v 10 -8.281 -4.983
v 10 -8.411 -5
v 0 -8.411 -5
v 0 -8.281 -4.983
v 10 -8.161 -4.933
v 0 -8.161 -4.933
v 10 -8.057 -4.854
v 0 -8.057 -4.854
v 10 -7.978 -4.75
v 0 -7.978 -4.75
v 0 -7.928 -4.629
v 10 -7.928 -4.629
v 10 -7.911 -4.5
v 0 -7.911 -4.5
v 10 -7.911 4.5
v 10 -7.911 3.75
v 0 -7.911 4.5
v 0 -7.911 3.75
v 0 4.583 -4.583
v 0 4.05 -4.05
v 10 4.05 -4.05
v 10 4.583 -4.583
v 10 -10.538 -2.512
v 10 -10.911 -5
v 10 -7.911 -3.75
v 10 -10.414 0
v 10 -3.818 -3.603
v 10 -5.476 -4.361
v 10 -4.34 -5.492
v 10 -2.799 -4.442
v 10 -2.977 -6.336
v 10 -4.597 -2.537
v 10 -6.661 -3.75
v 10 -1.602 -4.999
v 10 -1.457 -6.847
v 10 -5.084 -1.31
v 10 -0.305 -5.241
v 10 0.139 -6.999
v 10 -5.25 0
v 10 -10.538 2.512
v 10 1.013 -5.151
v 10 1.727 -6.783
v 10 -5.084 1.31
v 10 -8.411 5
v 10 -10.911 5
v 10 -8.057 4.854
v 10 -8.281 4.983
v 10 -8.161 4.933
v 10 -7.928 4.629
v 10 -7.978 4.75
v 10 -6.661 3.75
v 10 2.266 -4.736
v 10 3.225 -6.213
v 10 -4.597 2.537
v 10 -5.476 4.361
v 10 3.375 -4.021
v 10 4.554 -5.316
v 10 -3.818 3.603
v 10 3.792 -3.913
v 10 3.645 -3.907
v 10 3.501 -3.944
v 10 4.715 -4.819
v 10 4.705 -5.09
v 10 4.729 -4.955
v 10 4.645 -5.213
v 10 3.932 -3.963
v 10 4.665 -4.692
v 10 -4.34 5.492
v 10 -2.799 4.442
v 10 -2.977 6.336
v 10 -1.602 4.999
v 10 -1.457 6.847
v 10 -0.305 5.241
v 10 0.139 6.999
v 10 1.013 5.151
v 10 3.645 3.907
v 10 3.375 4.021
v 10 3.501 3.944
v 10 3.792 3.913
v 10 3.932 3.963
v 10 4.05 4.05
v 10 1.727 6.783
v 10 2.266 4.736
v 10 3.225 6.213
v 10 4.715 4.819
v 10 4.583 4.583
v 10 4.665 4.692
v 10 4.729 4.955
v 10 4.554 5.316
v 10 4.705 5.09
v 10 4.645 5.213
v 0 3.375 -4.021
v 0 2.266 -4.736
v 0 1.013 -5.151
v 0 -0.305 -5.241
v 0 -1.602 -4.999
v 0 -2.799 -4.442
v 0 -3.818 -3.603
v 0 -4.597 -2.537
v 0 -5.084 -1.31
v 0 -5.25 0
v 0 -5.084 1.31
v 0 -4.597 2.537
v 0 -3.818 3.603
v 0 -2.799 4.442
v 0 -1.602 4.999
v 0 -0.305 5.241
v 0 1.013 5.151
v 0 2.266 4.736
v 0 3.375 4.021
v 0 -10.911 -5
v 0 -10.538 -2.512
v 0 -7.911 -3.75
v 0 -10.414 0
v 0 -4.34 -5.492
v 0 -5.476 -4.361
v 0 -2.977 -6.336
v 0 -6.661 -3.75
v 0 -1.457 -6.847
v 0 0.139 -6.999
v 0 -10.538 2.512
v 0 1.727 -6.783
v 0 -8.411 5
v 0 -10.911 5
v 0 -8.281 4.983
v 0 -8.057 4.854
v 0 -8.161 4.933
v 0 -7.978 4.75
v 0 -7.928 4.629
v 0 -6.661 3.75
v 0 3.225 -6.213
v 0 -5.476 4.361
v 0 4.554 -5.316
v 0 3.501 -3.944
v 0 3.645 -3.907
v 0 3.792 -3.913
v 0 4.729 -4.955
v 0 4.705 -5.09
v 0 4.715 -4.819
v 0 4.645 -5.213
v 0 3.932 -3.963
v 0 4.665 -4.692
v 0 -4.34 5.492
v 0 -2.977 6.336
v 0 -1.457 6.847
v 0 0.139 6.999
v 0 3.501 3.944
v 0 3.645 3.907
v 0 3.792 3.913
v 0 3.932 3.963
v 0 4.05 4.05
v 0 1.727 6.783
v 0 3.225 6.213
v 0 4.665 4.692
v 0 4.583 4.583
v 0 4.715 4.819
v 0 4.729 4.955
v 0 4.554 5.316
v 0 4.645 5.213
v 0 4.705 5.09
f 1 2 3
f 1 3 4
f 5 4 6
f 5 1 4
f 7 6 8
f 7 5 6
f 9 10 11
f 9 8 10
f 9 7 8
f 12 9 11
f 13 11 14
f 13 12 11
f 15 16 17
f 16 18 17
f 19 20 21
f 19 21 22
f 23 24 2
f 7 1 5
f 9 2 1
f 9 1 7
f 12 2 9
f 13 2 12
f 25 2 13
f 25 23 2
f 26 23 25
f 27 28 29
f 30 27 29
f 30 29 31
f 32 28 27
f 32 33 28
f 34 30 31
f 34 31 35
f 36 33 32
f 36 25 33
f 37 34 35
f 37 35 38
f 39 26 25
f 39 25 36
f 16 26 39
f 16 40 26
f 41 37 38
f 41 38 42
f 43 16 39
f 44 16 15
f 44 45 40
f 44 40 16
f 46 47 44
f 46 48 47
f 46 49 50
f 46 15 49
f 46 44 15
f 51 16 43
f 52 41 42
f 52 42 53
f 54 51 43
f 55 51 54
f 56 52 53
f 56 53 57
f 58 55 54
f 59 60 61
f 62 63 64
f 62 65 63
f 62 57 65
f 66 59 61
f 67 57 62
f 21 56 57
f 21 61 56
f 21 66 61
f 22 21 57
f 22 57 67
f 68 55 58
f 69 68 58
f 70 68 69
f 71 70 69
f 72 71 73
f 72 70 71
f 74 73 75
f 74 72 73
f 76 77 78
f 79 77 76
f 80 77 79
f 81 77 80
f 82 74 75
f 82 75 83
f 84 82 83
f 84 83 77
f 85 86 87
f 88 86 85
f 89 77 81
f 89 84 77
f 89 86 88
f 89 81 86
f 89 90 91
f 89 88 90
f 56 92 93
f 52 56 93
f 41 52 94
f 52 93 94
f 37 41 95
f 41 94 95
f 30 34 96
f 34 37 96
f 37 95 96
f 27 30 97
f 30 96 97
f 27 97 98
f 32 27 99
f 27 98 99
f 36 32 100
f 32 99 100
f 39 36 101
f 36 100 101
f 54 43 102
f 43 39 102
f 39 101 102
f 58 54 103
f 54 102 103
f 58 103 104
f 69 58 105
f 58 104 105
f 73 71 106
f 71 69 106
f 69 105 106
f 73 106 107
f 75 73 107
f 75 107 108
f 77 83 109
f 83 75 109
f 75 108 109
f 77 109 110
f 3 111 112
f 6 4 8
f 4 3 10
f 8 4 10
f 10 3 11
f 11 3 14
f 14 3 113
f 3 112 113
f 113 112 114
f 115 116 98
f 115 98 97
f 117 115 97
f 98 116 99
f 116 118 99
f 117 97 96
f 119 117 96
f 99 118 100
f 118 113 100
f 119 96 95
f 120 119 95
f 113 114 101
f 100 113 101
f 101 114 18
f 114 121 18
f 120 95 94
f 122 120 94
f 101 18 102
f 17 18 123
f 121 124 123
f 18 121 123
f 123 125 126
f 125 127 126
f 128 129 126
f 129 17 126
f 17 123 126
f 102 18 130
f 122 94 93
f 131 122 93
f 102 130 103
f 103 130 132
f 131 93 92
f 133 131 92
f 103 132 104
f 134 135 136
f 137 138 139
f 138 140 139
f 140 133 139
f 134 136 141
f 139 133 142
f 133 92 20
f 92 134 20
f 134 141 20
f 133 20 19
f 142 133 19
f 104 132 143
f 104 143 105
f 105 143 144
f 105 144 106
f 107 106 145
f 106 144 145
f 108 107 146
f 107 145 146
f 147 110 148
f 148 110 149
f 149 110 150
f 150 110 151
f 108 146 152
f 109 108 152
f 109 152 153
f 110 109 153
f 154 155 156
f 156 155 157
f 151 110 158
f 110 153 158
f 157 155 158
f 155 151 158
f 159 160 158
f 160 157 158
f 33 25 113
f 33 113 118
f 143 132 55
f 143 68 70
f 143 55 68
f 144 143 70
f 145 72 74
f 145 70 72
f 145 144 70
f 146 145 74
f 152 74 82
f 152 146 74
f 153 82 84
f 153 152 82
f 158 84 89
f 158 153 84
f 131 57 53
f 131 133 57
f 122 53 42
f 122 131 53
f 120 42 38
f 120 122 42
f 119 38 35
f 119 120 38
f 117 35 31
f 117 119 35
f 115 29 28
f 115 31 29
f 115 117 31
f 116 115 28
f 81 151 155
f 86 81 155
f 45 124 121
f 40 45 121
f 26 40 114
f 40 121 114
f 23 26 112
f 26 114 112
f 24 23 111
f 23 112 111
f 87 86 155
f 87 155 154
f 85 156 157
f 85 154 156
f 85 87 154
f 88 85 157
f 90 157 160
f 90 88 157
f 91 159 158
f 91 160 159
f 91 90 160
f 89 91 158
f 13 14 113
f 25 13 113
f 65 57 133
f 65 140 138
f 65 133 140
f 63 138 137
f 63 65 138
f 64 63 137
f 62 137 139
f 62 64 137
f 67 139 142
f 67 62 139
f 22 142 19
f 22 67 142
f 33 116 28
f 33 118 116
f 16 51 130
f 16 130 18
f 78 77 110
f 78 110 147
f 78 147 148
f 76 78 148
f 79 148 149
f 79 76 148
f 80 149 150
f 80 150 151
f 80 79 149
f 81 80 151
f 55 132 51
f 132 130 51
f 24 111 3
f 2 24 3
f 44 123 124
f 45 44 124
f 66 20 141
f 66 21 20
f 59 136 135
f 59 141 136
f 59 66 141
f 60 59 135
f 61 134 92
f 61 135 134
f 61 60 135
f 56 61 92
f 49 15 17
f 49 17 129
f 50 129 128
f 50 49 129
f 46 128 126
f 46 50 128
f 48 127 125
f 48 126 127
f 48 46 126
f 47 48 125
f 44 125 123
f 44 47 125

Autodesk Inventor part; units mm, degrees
ref_plane "YZ Plane" through (0, 0, 0) normal (1, 0, 0) x (0, 1, 0)
ref_plane "XZ Plane" through (0, 0, 0) normal (0, 1, 0) x (-1, 0, 0)
ref_plane "XY Plane" through (0, 0, 0) normal (0, 0, 1) x (1, 0, 0)
sketch "Sketch1" plane through (0, 0, 0) normal (1, 0, 0) x (0, 1, 0)
  arc A0 (3.7123, 3.7123) -> (3.7123, -3.7123) centre (0, 0) ccw
  line L0 (-5.9108, 3.75) -> (-7.9108, 3.75)
  line L1 (-7.9108, -3.75) -> (-5.9108, -3.75)
  line L2 (3.7123, -3.7123) -> (4.9497, -4.9497)
  line L3 (3.7123, 3.7123) -> (4.9497, 4.9497)
  arc A1 (-5.9108, -3.75) -> (4.9497, -4.9497) centre (0, 0) ccw
  arc A2 (4.9497, 4.9497) -> (-5.9108, 3.75) centre (0, 0) ccw
  line L4 (4.9497, 4.9497) -> (0, 0) construction
  line L5 (0, 0) -> (4.9497, -4.9497) construction
  line L6 (-7.9108, 5) -> (-10.9108, 5)
  line L7 (-10.9108, -5) -> (-7.9108, -5)
  line L8 (-7.9108, -5) -> (-7.9108, -3.75)
  line L9 (-7.9108, 3.75) -> (-7.9108, 5)
  arc A3 (-10.9108, -5) -> (-10.9108, 5) centre (-35.8138, 0) ccw
  line L10 (-7.9108, 3.75) -> (-7.9108, -3.75) construction
  point P0 (-5.25, 0)
  point P1 (-13.9108, 0)
  point P2 (-7.9108, 4.375)
  point P3 (-7.9108, -4.375)
  point P4 (-7.9108, 0)
  dimension "d0" = 90
  dimension "d5" = 2
  dimension "d9" = 14
  dimension "d10" = 10.5
  dimension "d11" = 7.5
  dimension "d12" = 3
  dimension "d14" = 50.8
  dimension "d15" = 10
extrude "Extrusion1" add sketch "Sketch1" along normal blind 10
fillet "Fillet1" radius 0.5 6 edges at (5, -7.9108, -5) (5, 4.9497, -4.9497) (5, 4.9497, 4.9497) (5, 3.7123, 3.7123) (5, 3.7123, -3.7123) (5, -7.9108, 5)
chamfer "Chamfer1" distance 0.75 angle 45 2 edges at (5, -5.9108, 3.75) (5, -5.9108, -3.75)
properties part number "snap_grip"
